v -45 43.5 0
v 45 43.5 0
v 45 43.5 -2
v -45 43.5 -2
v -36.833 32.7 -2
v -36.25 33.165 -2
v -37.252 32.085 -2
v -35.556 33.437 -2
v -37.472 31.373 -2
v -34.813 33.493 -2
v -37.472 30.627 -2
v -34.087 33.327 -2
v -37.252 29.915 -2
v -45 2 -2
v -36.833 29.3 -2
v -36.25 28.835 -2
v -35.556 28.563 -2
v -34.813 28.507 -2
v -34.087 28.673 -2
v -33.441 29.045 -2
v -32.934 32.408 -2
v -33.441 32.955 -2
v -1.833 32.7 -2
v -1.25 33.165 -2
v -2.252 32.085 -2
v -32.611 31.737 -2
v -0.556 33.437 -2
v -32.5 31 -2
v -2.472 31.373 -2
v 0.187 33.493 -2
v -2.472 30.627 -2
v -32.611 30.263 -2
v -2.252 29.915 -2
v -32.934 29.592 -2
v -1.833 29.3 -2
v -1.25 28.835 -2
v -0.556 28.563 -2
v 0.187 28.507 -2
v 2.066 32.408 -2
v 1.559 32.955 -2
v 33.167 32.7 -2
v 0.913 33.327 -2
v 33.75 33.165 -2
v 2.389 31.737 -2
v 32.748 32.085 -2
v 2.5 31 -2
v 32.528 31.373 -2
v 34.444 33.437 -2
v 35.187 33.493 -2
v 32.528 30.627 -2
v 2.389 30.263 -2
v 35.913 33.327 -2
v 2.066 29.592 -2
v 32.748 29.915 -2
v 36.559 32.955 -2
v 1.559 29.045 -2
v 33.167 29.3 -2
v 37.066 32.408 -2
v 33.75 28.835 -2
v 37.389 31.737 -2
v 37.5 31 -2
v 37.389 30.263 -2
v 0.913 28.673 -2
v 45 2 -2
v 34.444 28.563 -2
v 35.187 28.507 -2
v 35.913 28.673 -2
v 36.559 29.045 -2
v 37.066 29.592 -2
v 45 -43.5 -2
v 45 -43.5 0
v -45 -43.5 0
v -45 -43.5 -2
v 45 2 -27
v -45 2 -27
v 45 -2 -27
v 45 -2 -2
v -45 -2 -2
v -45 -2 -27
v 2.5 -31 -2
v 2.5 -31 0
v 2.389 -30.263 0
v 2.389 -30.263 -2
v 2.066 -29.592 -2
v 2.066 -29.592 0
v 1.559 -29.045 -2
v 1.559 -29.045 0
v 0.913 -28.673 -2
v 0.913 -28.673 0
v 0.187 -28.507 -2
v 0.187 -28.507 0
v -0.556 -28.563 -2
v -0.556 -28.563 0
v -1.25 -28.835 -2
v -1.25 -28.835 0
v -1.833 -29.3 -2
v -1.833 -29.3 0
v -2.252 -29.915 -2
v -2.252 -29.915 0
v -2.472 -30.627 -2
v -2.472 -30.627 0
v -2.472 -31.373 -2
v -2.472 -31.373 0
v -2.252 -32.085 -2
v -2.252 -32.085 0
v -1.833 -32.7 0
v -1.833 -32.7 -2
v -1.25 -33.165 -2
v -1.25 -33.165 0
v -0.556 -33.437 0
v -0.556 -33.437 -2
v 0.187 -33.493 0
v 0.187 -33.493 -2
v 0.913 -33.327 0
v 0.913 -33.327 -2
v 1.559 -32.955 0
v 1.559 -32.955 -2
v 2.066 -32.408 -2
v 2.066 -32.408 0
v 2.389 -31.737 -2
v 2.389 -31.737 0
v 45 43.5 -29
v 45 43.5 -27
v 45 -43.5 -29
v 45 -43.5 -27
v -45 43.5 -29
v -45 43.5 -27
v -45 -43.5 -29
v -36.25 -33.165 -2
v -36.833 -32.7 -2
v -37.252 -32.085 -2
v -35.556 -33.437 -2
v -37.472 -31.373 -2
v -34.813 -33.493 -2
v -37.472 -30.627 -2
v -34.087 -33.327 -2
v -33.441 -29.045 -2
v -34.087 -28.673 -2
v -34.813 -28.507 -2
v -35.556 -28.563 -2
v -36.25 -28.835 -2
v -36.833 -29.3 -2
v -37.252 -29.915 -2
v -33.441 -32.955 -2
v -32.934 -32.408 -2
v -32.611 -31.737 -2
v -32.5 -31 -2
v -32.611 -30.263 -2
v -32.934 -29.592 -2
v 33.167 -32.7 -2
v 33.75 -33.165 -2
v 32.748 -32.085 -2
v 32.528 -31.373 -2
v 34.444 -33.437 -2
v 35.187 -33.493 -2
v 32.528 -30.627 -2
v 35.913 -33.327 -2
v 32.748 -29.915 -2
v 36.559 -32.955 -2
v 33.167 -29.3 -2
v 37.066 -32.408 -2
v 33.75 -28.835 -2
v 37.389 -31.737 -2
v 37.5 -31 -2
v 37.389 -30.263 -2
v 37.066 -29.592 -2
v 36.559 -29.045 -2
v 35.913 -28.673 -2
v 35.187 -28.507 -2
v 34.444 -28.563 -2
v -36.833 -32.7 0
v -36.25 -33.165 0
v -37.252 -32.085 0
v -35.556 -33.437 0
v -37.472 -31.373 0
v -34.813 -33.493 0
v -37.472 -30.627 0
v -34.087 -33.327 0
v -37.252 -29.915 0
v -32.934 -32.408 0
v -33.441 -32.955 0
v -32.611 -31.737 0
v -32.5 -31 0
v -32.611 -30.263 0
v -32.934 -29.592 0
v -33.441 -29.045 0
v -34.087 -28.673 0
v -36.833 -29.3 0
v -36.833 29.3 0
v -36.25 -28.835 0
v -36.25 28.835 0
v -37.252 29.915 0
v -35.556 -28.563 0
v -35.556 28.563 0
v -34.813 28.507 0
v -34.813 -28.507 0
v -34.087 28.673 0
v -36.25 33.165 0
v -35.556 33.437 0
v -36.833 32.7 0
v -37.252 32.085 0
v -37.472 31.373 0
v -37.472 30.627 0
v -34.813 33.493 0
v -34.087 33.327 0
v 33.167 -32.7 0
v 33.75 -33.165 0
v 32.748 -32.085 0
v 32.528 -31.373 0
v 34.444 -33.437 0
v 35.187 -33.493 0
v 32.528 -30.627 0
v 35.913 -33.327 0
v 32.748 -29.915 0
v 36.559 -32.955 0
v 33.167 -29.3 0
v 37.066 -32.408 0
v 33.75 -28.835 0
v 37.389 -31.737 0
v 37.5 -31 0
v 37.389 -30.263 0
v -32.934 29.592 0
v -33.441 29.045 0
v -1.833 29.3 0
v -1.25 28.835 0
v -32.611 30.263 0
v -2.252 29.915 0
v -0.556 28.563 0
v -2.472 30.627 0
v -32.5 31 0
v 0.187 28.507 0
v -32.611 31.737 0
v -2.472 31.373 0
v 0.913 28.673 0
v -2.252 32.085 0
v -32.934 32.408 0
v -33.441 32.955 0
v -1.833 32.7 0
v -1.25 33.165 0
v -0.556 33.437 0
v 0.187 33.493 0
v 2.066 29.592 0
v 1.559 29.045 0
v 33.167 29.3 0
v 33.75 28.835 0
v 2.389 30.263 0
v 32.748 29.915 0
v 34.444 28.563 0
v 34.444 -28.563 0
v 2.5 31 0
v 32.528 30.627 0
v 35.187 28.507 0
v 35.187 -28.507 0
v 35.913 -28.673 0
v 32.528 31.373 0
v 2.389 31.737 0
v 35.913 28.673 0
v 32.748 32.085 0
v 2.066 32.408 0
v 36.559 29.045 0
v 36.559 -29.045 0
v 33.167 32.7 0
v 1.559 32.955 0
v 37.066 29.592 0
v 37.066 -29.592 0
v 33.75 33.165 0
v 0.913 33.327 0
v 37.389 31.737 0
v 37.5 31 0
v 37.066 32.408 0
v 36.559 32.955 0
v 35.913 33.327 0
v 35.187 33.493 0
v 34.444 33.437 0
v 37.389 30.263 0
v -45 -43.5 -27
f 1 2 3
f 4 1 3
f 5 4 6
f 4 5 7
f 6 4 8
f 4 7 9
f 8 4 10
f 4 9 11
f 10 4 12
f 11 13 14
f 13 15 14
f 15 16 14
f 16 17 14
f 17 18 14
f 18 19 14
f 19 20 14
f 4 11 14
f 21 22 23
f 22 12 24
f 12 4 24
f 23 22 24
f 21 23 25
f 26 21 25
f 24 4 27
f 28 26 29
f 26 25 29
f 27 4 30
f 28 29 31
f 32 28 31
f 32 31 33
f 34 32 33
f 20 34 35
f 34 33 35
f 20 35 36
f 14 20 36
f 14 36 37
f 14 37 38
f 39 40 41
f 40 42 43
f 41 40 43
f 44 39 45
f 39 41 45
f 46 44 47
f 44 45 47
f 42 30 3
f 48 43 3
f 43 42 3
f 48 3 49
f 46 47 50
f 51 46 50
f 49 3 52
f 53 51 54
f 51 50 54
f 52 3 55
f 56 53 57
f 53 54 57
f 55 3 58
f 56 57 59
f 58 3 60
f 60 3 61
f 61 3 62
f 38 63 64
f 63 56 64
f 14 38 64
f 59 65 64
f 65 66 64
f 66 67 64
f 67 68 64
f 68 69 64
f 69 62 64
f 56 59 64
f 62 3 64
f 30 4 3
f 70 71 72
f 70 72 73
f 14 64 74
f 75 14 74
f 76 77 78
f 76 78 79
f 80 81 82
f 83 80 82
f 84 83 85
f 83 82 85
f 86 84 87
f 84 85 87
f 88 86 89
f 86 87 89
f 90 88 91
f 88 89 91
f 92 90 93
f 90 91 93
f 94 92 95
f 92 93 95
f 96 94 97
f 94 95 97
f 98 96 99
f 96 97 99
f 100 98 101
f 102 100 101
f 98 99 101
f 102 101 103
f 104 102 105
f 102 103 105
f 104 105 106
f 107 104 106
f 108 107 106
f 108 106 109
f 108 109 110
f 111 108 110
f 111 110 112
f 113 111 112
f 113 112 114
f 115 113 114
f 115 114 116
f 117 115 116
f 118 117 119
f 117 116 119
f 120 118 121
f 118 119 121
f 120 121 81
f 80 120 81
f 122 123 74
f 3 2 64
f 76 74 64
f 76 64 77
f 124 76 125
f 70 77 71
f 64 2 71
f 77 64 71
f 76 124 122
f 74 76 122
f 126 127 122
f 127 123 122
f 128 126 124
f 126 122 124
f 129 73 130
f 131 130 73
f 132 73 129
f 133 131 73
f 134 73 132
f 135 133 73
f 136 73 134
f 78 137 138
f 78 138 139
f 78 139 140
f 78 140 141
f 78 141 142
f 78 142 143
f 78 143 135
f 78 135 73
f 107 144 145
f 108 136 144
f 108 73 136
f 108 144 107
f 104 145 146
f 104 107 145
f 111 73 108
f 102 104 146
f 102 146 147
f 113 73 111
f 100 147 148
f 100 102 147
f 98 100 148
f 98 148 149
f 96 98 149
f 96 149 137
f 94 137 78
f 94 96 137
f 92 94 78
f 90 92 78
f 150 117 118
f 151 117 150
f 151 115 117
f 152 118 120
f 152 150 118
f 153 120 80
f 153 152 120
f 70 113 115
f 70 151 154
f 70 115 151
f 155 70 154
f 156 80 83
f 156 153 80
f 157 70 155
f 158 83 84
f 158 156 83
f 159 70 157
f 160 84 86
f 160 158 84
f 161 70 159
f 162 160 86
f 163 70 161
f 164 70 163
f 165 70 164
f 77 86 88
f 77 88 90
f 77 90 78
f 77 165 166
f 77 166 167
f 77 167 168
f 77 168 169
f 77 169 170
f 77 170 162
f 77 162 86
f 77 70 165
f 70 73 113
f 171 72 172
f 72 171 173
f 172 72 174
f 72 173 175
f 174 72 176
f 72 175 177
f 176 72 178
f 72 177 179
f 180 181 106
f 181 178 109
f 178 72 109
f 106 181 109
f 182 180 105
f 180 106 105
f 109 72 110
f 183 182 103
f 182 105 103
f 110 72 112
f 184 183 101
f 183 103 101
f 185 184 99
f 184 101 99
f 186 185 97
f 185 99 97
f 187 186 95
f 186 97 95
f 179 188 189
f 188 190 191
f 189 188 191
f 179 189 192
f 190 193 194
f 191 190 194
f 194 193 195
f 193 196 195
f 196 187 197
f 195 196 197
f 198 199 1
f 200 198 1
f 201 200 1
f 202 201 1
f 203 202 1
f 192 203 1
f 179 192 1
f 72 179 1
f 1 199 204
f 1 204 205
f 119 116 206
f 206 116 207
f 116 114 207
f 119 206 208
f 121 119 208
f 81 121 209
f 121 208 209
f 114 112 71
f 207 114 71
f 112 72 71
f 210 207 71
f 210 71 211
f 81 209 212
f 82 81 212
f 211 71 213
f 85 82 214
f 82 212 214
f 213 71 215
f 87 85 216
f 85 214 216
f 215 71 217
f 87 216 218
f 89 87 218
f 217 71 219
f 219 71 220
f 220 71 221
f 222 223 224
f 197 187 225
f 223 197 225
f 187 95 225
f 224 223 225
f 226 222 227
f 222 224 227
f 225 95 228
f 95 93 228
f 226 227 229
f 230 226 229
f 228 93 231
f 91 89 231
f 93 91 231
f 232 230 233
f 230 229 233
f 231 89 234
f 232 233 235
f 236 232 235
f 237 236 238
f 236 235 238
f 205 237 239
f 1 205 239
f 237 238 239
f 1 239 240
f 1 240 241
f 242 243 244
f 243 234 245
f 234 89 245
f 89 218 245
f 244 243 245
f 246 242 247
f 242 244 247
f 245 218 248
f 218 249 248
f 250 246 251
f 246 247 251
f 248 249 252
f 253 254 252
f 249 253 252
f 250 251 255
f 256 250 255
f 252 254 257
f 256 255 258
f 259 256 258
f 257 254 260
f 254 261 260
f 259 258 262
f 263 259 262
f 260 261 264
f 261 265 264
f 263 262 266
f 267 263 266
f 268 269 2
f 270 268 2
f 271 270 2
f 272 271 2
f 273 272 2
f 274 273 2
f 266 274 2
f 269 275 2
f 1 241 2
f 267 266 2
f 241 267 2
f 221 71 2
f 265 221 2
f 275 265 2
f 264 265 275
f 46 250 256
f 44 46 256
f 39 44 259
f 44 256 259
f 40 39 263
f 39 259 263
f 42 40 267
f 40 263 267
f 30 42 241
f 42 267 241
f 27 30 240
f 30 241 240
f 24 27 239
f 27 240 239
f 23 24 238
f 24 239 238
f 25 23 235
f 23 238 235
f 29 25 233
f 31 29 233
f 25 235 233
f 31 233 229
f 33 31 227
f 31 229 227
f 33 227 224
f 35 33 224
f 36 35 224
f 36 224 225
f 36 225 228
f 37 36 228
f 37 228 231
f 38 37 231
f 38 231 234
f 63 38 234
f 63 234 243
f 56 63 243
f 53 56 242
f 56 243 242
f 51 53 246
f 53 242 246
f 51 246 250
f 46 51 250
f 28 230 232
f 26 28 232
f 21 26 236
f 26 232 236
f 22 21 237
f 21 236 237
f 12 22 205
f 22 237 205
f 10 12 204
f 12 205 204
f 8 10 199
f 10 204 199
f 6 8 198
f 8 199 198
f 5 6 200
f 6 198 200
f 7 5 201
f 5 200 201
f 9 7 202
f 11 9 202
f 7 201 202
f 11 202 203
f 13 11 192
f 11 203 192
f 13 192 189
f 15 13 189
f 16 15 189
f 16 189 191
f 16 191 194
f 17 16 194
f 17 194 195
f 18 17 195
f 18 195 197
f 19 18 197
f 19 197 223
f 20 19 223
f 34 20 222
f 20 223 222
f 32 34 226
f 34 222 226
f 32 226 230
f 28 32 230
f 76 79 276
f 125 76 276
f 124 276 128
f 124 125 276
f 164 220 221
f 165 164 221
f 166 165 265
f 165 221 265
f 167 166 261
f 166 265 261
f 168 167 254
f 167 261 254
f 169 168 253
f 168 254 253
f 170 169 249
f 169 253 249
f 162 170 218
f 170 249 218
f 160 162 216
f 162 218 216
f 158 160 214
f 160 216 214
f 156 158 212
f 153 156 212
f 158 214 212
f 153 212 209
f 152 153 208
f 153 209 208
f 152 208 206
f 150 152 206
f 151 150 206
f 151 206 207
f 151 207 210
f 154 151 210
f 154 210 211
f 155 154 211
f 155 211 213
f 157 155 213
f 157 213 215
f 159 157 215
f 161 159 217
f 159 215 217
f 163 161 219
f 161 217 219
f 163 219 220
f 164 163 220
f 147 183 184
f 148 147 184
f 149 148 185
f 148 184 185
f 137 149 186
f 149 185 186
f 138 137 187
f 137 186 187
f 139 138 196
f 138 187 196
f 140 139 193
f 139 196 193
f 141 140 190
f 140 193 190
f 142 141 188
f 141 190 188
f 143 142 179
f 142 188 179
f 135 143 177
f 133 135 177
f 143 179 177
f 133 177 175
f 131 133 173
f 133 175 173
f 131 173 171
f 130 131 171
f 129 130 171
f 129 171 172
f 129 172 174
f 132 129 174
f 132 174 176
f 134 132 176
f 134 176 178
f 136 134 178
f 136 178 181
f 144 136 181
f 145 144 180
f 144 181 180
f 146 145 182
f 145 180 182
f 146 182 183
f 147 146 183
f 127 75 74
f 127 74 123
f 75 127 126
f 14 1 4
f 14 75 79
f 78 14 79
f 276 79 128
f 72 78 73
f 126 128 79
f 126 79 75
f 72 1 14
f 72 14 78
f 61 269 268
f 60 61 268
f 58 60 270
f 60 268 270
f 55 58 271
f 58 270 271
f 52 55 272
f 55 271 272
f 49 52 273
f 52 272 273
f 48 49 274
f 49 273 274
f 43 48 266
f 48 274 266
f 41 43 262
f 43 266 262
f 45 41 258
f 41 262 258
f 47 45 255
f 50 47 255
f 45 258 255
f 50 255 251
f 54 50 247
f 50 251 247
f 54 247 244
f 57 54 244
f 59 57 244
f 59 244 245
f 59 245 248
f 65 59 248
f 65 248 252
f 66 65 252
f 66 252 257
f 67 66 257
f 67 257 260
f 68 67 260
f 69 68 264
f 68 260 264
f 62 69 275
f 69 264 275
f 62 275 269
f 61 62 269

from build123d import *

# Parameters (mm, degrees)
F1_DEPTH = 45
F3_R     = 2.5
F4_DEPTH = 2


with BuildPart() as f1:
    # F0 (on Right) → F1 (new body, symmetric)
    with BuildSketch(Plane.YZ):
        Polygon((0, -29), (0, 0), (-43.5, 0), (-43.5, -2), (-2, -2), (-2, -27), (-43.5, -27), (-43.5, -29), align=None)
    extrude(amount=F1_DEPTH, both=True)

    # F2: F1 across plane


with BuildPart() as f1_1:
    add(f1.part)
    add(f1.part.mirror(Plane.XZ))

    # F3 (on face) → F4 (cut, through all)
    with BuildSketch(Plane.XY):
        with Locations((35, 31)):
            Circle(F3_R)
        with Locations((0, 31)):
            Circle(F3_R)
        with Locations((-35, 31)):
            Circle(F3_R)
        with Locations((-35, -31)):
            Circle(F3_R)
        with Locations((0, -31)):
            Circle(F3_R)
        with Locations((35, -31)):
            Circle(F3_R)
    extrude(amount=-F4_DEPTH, mode=Mode.SUBTRACT)


solid = f1_1.part
